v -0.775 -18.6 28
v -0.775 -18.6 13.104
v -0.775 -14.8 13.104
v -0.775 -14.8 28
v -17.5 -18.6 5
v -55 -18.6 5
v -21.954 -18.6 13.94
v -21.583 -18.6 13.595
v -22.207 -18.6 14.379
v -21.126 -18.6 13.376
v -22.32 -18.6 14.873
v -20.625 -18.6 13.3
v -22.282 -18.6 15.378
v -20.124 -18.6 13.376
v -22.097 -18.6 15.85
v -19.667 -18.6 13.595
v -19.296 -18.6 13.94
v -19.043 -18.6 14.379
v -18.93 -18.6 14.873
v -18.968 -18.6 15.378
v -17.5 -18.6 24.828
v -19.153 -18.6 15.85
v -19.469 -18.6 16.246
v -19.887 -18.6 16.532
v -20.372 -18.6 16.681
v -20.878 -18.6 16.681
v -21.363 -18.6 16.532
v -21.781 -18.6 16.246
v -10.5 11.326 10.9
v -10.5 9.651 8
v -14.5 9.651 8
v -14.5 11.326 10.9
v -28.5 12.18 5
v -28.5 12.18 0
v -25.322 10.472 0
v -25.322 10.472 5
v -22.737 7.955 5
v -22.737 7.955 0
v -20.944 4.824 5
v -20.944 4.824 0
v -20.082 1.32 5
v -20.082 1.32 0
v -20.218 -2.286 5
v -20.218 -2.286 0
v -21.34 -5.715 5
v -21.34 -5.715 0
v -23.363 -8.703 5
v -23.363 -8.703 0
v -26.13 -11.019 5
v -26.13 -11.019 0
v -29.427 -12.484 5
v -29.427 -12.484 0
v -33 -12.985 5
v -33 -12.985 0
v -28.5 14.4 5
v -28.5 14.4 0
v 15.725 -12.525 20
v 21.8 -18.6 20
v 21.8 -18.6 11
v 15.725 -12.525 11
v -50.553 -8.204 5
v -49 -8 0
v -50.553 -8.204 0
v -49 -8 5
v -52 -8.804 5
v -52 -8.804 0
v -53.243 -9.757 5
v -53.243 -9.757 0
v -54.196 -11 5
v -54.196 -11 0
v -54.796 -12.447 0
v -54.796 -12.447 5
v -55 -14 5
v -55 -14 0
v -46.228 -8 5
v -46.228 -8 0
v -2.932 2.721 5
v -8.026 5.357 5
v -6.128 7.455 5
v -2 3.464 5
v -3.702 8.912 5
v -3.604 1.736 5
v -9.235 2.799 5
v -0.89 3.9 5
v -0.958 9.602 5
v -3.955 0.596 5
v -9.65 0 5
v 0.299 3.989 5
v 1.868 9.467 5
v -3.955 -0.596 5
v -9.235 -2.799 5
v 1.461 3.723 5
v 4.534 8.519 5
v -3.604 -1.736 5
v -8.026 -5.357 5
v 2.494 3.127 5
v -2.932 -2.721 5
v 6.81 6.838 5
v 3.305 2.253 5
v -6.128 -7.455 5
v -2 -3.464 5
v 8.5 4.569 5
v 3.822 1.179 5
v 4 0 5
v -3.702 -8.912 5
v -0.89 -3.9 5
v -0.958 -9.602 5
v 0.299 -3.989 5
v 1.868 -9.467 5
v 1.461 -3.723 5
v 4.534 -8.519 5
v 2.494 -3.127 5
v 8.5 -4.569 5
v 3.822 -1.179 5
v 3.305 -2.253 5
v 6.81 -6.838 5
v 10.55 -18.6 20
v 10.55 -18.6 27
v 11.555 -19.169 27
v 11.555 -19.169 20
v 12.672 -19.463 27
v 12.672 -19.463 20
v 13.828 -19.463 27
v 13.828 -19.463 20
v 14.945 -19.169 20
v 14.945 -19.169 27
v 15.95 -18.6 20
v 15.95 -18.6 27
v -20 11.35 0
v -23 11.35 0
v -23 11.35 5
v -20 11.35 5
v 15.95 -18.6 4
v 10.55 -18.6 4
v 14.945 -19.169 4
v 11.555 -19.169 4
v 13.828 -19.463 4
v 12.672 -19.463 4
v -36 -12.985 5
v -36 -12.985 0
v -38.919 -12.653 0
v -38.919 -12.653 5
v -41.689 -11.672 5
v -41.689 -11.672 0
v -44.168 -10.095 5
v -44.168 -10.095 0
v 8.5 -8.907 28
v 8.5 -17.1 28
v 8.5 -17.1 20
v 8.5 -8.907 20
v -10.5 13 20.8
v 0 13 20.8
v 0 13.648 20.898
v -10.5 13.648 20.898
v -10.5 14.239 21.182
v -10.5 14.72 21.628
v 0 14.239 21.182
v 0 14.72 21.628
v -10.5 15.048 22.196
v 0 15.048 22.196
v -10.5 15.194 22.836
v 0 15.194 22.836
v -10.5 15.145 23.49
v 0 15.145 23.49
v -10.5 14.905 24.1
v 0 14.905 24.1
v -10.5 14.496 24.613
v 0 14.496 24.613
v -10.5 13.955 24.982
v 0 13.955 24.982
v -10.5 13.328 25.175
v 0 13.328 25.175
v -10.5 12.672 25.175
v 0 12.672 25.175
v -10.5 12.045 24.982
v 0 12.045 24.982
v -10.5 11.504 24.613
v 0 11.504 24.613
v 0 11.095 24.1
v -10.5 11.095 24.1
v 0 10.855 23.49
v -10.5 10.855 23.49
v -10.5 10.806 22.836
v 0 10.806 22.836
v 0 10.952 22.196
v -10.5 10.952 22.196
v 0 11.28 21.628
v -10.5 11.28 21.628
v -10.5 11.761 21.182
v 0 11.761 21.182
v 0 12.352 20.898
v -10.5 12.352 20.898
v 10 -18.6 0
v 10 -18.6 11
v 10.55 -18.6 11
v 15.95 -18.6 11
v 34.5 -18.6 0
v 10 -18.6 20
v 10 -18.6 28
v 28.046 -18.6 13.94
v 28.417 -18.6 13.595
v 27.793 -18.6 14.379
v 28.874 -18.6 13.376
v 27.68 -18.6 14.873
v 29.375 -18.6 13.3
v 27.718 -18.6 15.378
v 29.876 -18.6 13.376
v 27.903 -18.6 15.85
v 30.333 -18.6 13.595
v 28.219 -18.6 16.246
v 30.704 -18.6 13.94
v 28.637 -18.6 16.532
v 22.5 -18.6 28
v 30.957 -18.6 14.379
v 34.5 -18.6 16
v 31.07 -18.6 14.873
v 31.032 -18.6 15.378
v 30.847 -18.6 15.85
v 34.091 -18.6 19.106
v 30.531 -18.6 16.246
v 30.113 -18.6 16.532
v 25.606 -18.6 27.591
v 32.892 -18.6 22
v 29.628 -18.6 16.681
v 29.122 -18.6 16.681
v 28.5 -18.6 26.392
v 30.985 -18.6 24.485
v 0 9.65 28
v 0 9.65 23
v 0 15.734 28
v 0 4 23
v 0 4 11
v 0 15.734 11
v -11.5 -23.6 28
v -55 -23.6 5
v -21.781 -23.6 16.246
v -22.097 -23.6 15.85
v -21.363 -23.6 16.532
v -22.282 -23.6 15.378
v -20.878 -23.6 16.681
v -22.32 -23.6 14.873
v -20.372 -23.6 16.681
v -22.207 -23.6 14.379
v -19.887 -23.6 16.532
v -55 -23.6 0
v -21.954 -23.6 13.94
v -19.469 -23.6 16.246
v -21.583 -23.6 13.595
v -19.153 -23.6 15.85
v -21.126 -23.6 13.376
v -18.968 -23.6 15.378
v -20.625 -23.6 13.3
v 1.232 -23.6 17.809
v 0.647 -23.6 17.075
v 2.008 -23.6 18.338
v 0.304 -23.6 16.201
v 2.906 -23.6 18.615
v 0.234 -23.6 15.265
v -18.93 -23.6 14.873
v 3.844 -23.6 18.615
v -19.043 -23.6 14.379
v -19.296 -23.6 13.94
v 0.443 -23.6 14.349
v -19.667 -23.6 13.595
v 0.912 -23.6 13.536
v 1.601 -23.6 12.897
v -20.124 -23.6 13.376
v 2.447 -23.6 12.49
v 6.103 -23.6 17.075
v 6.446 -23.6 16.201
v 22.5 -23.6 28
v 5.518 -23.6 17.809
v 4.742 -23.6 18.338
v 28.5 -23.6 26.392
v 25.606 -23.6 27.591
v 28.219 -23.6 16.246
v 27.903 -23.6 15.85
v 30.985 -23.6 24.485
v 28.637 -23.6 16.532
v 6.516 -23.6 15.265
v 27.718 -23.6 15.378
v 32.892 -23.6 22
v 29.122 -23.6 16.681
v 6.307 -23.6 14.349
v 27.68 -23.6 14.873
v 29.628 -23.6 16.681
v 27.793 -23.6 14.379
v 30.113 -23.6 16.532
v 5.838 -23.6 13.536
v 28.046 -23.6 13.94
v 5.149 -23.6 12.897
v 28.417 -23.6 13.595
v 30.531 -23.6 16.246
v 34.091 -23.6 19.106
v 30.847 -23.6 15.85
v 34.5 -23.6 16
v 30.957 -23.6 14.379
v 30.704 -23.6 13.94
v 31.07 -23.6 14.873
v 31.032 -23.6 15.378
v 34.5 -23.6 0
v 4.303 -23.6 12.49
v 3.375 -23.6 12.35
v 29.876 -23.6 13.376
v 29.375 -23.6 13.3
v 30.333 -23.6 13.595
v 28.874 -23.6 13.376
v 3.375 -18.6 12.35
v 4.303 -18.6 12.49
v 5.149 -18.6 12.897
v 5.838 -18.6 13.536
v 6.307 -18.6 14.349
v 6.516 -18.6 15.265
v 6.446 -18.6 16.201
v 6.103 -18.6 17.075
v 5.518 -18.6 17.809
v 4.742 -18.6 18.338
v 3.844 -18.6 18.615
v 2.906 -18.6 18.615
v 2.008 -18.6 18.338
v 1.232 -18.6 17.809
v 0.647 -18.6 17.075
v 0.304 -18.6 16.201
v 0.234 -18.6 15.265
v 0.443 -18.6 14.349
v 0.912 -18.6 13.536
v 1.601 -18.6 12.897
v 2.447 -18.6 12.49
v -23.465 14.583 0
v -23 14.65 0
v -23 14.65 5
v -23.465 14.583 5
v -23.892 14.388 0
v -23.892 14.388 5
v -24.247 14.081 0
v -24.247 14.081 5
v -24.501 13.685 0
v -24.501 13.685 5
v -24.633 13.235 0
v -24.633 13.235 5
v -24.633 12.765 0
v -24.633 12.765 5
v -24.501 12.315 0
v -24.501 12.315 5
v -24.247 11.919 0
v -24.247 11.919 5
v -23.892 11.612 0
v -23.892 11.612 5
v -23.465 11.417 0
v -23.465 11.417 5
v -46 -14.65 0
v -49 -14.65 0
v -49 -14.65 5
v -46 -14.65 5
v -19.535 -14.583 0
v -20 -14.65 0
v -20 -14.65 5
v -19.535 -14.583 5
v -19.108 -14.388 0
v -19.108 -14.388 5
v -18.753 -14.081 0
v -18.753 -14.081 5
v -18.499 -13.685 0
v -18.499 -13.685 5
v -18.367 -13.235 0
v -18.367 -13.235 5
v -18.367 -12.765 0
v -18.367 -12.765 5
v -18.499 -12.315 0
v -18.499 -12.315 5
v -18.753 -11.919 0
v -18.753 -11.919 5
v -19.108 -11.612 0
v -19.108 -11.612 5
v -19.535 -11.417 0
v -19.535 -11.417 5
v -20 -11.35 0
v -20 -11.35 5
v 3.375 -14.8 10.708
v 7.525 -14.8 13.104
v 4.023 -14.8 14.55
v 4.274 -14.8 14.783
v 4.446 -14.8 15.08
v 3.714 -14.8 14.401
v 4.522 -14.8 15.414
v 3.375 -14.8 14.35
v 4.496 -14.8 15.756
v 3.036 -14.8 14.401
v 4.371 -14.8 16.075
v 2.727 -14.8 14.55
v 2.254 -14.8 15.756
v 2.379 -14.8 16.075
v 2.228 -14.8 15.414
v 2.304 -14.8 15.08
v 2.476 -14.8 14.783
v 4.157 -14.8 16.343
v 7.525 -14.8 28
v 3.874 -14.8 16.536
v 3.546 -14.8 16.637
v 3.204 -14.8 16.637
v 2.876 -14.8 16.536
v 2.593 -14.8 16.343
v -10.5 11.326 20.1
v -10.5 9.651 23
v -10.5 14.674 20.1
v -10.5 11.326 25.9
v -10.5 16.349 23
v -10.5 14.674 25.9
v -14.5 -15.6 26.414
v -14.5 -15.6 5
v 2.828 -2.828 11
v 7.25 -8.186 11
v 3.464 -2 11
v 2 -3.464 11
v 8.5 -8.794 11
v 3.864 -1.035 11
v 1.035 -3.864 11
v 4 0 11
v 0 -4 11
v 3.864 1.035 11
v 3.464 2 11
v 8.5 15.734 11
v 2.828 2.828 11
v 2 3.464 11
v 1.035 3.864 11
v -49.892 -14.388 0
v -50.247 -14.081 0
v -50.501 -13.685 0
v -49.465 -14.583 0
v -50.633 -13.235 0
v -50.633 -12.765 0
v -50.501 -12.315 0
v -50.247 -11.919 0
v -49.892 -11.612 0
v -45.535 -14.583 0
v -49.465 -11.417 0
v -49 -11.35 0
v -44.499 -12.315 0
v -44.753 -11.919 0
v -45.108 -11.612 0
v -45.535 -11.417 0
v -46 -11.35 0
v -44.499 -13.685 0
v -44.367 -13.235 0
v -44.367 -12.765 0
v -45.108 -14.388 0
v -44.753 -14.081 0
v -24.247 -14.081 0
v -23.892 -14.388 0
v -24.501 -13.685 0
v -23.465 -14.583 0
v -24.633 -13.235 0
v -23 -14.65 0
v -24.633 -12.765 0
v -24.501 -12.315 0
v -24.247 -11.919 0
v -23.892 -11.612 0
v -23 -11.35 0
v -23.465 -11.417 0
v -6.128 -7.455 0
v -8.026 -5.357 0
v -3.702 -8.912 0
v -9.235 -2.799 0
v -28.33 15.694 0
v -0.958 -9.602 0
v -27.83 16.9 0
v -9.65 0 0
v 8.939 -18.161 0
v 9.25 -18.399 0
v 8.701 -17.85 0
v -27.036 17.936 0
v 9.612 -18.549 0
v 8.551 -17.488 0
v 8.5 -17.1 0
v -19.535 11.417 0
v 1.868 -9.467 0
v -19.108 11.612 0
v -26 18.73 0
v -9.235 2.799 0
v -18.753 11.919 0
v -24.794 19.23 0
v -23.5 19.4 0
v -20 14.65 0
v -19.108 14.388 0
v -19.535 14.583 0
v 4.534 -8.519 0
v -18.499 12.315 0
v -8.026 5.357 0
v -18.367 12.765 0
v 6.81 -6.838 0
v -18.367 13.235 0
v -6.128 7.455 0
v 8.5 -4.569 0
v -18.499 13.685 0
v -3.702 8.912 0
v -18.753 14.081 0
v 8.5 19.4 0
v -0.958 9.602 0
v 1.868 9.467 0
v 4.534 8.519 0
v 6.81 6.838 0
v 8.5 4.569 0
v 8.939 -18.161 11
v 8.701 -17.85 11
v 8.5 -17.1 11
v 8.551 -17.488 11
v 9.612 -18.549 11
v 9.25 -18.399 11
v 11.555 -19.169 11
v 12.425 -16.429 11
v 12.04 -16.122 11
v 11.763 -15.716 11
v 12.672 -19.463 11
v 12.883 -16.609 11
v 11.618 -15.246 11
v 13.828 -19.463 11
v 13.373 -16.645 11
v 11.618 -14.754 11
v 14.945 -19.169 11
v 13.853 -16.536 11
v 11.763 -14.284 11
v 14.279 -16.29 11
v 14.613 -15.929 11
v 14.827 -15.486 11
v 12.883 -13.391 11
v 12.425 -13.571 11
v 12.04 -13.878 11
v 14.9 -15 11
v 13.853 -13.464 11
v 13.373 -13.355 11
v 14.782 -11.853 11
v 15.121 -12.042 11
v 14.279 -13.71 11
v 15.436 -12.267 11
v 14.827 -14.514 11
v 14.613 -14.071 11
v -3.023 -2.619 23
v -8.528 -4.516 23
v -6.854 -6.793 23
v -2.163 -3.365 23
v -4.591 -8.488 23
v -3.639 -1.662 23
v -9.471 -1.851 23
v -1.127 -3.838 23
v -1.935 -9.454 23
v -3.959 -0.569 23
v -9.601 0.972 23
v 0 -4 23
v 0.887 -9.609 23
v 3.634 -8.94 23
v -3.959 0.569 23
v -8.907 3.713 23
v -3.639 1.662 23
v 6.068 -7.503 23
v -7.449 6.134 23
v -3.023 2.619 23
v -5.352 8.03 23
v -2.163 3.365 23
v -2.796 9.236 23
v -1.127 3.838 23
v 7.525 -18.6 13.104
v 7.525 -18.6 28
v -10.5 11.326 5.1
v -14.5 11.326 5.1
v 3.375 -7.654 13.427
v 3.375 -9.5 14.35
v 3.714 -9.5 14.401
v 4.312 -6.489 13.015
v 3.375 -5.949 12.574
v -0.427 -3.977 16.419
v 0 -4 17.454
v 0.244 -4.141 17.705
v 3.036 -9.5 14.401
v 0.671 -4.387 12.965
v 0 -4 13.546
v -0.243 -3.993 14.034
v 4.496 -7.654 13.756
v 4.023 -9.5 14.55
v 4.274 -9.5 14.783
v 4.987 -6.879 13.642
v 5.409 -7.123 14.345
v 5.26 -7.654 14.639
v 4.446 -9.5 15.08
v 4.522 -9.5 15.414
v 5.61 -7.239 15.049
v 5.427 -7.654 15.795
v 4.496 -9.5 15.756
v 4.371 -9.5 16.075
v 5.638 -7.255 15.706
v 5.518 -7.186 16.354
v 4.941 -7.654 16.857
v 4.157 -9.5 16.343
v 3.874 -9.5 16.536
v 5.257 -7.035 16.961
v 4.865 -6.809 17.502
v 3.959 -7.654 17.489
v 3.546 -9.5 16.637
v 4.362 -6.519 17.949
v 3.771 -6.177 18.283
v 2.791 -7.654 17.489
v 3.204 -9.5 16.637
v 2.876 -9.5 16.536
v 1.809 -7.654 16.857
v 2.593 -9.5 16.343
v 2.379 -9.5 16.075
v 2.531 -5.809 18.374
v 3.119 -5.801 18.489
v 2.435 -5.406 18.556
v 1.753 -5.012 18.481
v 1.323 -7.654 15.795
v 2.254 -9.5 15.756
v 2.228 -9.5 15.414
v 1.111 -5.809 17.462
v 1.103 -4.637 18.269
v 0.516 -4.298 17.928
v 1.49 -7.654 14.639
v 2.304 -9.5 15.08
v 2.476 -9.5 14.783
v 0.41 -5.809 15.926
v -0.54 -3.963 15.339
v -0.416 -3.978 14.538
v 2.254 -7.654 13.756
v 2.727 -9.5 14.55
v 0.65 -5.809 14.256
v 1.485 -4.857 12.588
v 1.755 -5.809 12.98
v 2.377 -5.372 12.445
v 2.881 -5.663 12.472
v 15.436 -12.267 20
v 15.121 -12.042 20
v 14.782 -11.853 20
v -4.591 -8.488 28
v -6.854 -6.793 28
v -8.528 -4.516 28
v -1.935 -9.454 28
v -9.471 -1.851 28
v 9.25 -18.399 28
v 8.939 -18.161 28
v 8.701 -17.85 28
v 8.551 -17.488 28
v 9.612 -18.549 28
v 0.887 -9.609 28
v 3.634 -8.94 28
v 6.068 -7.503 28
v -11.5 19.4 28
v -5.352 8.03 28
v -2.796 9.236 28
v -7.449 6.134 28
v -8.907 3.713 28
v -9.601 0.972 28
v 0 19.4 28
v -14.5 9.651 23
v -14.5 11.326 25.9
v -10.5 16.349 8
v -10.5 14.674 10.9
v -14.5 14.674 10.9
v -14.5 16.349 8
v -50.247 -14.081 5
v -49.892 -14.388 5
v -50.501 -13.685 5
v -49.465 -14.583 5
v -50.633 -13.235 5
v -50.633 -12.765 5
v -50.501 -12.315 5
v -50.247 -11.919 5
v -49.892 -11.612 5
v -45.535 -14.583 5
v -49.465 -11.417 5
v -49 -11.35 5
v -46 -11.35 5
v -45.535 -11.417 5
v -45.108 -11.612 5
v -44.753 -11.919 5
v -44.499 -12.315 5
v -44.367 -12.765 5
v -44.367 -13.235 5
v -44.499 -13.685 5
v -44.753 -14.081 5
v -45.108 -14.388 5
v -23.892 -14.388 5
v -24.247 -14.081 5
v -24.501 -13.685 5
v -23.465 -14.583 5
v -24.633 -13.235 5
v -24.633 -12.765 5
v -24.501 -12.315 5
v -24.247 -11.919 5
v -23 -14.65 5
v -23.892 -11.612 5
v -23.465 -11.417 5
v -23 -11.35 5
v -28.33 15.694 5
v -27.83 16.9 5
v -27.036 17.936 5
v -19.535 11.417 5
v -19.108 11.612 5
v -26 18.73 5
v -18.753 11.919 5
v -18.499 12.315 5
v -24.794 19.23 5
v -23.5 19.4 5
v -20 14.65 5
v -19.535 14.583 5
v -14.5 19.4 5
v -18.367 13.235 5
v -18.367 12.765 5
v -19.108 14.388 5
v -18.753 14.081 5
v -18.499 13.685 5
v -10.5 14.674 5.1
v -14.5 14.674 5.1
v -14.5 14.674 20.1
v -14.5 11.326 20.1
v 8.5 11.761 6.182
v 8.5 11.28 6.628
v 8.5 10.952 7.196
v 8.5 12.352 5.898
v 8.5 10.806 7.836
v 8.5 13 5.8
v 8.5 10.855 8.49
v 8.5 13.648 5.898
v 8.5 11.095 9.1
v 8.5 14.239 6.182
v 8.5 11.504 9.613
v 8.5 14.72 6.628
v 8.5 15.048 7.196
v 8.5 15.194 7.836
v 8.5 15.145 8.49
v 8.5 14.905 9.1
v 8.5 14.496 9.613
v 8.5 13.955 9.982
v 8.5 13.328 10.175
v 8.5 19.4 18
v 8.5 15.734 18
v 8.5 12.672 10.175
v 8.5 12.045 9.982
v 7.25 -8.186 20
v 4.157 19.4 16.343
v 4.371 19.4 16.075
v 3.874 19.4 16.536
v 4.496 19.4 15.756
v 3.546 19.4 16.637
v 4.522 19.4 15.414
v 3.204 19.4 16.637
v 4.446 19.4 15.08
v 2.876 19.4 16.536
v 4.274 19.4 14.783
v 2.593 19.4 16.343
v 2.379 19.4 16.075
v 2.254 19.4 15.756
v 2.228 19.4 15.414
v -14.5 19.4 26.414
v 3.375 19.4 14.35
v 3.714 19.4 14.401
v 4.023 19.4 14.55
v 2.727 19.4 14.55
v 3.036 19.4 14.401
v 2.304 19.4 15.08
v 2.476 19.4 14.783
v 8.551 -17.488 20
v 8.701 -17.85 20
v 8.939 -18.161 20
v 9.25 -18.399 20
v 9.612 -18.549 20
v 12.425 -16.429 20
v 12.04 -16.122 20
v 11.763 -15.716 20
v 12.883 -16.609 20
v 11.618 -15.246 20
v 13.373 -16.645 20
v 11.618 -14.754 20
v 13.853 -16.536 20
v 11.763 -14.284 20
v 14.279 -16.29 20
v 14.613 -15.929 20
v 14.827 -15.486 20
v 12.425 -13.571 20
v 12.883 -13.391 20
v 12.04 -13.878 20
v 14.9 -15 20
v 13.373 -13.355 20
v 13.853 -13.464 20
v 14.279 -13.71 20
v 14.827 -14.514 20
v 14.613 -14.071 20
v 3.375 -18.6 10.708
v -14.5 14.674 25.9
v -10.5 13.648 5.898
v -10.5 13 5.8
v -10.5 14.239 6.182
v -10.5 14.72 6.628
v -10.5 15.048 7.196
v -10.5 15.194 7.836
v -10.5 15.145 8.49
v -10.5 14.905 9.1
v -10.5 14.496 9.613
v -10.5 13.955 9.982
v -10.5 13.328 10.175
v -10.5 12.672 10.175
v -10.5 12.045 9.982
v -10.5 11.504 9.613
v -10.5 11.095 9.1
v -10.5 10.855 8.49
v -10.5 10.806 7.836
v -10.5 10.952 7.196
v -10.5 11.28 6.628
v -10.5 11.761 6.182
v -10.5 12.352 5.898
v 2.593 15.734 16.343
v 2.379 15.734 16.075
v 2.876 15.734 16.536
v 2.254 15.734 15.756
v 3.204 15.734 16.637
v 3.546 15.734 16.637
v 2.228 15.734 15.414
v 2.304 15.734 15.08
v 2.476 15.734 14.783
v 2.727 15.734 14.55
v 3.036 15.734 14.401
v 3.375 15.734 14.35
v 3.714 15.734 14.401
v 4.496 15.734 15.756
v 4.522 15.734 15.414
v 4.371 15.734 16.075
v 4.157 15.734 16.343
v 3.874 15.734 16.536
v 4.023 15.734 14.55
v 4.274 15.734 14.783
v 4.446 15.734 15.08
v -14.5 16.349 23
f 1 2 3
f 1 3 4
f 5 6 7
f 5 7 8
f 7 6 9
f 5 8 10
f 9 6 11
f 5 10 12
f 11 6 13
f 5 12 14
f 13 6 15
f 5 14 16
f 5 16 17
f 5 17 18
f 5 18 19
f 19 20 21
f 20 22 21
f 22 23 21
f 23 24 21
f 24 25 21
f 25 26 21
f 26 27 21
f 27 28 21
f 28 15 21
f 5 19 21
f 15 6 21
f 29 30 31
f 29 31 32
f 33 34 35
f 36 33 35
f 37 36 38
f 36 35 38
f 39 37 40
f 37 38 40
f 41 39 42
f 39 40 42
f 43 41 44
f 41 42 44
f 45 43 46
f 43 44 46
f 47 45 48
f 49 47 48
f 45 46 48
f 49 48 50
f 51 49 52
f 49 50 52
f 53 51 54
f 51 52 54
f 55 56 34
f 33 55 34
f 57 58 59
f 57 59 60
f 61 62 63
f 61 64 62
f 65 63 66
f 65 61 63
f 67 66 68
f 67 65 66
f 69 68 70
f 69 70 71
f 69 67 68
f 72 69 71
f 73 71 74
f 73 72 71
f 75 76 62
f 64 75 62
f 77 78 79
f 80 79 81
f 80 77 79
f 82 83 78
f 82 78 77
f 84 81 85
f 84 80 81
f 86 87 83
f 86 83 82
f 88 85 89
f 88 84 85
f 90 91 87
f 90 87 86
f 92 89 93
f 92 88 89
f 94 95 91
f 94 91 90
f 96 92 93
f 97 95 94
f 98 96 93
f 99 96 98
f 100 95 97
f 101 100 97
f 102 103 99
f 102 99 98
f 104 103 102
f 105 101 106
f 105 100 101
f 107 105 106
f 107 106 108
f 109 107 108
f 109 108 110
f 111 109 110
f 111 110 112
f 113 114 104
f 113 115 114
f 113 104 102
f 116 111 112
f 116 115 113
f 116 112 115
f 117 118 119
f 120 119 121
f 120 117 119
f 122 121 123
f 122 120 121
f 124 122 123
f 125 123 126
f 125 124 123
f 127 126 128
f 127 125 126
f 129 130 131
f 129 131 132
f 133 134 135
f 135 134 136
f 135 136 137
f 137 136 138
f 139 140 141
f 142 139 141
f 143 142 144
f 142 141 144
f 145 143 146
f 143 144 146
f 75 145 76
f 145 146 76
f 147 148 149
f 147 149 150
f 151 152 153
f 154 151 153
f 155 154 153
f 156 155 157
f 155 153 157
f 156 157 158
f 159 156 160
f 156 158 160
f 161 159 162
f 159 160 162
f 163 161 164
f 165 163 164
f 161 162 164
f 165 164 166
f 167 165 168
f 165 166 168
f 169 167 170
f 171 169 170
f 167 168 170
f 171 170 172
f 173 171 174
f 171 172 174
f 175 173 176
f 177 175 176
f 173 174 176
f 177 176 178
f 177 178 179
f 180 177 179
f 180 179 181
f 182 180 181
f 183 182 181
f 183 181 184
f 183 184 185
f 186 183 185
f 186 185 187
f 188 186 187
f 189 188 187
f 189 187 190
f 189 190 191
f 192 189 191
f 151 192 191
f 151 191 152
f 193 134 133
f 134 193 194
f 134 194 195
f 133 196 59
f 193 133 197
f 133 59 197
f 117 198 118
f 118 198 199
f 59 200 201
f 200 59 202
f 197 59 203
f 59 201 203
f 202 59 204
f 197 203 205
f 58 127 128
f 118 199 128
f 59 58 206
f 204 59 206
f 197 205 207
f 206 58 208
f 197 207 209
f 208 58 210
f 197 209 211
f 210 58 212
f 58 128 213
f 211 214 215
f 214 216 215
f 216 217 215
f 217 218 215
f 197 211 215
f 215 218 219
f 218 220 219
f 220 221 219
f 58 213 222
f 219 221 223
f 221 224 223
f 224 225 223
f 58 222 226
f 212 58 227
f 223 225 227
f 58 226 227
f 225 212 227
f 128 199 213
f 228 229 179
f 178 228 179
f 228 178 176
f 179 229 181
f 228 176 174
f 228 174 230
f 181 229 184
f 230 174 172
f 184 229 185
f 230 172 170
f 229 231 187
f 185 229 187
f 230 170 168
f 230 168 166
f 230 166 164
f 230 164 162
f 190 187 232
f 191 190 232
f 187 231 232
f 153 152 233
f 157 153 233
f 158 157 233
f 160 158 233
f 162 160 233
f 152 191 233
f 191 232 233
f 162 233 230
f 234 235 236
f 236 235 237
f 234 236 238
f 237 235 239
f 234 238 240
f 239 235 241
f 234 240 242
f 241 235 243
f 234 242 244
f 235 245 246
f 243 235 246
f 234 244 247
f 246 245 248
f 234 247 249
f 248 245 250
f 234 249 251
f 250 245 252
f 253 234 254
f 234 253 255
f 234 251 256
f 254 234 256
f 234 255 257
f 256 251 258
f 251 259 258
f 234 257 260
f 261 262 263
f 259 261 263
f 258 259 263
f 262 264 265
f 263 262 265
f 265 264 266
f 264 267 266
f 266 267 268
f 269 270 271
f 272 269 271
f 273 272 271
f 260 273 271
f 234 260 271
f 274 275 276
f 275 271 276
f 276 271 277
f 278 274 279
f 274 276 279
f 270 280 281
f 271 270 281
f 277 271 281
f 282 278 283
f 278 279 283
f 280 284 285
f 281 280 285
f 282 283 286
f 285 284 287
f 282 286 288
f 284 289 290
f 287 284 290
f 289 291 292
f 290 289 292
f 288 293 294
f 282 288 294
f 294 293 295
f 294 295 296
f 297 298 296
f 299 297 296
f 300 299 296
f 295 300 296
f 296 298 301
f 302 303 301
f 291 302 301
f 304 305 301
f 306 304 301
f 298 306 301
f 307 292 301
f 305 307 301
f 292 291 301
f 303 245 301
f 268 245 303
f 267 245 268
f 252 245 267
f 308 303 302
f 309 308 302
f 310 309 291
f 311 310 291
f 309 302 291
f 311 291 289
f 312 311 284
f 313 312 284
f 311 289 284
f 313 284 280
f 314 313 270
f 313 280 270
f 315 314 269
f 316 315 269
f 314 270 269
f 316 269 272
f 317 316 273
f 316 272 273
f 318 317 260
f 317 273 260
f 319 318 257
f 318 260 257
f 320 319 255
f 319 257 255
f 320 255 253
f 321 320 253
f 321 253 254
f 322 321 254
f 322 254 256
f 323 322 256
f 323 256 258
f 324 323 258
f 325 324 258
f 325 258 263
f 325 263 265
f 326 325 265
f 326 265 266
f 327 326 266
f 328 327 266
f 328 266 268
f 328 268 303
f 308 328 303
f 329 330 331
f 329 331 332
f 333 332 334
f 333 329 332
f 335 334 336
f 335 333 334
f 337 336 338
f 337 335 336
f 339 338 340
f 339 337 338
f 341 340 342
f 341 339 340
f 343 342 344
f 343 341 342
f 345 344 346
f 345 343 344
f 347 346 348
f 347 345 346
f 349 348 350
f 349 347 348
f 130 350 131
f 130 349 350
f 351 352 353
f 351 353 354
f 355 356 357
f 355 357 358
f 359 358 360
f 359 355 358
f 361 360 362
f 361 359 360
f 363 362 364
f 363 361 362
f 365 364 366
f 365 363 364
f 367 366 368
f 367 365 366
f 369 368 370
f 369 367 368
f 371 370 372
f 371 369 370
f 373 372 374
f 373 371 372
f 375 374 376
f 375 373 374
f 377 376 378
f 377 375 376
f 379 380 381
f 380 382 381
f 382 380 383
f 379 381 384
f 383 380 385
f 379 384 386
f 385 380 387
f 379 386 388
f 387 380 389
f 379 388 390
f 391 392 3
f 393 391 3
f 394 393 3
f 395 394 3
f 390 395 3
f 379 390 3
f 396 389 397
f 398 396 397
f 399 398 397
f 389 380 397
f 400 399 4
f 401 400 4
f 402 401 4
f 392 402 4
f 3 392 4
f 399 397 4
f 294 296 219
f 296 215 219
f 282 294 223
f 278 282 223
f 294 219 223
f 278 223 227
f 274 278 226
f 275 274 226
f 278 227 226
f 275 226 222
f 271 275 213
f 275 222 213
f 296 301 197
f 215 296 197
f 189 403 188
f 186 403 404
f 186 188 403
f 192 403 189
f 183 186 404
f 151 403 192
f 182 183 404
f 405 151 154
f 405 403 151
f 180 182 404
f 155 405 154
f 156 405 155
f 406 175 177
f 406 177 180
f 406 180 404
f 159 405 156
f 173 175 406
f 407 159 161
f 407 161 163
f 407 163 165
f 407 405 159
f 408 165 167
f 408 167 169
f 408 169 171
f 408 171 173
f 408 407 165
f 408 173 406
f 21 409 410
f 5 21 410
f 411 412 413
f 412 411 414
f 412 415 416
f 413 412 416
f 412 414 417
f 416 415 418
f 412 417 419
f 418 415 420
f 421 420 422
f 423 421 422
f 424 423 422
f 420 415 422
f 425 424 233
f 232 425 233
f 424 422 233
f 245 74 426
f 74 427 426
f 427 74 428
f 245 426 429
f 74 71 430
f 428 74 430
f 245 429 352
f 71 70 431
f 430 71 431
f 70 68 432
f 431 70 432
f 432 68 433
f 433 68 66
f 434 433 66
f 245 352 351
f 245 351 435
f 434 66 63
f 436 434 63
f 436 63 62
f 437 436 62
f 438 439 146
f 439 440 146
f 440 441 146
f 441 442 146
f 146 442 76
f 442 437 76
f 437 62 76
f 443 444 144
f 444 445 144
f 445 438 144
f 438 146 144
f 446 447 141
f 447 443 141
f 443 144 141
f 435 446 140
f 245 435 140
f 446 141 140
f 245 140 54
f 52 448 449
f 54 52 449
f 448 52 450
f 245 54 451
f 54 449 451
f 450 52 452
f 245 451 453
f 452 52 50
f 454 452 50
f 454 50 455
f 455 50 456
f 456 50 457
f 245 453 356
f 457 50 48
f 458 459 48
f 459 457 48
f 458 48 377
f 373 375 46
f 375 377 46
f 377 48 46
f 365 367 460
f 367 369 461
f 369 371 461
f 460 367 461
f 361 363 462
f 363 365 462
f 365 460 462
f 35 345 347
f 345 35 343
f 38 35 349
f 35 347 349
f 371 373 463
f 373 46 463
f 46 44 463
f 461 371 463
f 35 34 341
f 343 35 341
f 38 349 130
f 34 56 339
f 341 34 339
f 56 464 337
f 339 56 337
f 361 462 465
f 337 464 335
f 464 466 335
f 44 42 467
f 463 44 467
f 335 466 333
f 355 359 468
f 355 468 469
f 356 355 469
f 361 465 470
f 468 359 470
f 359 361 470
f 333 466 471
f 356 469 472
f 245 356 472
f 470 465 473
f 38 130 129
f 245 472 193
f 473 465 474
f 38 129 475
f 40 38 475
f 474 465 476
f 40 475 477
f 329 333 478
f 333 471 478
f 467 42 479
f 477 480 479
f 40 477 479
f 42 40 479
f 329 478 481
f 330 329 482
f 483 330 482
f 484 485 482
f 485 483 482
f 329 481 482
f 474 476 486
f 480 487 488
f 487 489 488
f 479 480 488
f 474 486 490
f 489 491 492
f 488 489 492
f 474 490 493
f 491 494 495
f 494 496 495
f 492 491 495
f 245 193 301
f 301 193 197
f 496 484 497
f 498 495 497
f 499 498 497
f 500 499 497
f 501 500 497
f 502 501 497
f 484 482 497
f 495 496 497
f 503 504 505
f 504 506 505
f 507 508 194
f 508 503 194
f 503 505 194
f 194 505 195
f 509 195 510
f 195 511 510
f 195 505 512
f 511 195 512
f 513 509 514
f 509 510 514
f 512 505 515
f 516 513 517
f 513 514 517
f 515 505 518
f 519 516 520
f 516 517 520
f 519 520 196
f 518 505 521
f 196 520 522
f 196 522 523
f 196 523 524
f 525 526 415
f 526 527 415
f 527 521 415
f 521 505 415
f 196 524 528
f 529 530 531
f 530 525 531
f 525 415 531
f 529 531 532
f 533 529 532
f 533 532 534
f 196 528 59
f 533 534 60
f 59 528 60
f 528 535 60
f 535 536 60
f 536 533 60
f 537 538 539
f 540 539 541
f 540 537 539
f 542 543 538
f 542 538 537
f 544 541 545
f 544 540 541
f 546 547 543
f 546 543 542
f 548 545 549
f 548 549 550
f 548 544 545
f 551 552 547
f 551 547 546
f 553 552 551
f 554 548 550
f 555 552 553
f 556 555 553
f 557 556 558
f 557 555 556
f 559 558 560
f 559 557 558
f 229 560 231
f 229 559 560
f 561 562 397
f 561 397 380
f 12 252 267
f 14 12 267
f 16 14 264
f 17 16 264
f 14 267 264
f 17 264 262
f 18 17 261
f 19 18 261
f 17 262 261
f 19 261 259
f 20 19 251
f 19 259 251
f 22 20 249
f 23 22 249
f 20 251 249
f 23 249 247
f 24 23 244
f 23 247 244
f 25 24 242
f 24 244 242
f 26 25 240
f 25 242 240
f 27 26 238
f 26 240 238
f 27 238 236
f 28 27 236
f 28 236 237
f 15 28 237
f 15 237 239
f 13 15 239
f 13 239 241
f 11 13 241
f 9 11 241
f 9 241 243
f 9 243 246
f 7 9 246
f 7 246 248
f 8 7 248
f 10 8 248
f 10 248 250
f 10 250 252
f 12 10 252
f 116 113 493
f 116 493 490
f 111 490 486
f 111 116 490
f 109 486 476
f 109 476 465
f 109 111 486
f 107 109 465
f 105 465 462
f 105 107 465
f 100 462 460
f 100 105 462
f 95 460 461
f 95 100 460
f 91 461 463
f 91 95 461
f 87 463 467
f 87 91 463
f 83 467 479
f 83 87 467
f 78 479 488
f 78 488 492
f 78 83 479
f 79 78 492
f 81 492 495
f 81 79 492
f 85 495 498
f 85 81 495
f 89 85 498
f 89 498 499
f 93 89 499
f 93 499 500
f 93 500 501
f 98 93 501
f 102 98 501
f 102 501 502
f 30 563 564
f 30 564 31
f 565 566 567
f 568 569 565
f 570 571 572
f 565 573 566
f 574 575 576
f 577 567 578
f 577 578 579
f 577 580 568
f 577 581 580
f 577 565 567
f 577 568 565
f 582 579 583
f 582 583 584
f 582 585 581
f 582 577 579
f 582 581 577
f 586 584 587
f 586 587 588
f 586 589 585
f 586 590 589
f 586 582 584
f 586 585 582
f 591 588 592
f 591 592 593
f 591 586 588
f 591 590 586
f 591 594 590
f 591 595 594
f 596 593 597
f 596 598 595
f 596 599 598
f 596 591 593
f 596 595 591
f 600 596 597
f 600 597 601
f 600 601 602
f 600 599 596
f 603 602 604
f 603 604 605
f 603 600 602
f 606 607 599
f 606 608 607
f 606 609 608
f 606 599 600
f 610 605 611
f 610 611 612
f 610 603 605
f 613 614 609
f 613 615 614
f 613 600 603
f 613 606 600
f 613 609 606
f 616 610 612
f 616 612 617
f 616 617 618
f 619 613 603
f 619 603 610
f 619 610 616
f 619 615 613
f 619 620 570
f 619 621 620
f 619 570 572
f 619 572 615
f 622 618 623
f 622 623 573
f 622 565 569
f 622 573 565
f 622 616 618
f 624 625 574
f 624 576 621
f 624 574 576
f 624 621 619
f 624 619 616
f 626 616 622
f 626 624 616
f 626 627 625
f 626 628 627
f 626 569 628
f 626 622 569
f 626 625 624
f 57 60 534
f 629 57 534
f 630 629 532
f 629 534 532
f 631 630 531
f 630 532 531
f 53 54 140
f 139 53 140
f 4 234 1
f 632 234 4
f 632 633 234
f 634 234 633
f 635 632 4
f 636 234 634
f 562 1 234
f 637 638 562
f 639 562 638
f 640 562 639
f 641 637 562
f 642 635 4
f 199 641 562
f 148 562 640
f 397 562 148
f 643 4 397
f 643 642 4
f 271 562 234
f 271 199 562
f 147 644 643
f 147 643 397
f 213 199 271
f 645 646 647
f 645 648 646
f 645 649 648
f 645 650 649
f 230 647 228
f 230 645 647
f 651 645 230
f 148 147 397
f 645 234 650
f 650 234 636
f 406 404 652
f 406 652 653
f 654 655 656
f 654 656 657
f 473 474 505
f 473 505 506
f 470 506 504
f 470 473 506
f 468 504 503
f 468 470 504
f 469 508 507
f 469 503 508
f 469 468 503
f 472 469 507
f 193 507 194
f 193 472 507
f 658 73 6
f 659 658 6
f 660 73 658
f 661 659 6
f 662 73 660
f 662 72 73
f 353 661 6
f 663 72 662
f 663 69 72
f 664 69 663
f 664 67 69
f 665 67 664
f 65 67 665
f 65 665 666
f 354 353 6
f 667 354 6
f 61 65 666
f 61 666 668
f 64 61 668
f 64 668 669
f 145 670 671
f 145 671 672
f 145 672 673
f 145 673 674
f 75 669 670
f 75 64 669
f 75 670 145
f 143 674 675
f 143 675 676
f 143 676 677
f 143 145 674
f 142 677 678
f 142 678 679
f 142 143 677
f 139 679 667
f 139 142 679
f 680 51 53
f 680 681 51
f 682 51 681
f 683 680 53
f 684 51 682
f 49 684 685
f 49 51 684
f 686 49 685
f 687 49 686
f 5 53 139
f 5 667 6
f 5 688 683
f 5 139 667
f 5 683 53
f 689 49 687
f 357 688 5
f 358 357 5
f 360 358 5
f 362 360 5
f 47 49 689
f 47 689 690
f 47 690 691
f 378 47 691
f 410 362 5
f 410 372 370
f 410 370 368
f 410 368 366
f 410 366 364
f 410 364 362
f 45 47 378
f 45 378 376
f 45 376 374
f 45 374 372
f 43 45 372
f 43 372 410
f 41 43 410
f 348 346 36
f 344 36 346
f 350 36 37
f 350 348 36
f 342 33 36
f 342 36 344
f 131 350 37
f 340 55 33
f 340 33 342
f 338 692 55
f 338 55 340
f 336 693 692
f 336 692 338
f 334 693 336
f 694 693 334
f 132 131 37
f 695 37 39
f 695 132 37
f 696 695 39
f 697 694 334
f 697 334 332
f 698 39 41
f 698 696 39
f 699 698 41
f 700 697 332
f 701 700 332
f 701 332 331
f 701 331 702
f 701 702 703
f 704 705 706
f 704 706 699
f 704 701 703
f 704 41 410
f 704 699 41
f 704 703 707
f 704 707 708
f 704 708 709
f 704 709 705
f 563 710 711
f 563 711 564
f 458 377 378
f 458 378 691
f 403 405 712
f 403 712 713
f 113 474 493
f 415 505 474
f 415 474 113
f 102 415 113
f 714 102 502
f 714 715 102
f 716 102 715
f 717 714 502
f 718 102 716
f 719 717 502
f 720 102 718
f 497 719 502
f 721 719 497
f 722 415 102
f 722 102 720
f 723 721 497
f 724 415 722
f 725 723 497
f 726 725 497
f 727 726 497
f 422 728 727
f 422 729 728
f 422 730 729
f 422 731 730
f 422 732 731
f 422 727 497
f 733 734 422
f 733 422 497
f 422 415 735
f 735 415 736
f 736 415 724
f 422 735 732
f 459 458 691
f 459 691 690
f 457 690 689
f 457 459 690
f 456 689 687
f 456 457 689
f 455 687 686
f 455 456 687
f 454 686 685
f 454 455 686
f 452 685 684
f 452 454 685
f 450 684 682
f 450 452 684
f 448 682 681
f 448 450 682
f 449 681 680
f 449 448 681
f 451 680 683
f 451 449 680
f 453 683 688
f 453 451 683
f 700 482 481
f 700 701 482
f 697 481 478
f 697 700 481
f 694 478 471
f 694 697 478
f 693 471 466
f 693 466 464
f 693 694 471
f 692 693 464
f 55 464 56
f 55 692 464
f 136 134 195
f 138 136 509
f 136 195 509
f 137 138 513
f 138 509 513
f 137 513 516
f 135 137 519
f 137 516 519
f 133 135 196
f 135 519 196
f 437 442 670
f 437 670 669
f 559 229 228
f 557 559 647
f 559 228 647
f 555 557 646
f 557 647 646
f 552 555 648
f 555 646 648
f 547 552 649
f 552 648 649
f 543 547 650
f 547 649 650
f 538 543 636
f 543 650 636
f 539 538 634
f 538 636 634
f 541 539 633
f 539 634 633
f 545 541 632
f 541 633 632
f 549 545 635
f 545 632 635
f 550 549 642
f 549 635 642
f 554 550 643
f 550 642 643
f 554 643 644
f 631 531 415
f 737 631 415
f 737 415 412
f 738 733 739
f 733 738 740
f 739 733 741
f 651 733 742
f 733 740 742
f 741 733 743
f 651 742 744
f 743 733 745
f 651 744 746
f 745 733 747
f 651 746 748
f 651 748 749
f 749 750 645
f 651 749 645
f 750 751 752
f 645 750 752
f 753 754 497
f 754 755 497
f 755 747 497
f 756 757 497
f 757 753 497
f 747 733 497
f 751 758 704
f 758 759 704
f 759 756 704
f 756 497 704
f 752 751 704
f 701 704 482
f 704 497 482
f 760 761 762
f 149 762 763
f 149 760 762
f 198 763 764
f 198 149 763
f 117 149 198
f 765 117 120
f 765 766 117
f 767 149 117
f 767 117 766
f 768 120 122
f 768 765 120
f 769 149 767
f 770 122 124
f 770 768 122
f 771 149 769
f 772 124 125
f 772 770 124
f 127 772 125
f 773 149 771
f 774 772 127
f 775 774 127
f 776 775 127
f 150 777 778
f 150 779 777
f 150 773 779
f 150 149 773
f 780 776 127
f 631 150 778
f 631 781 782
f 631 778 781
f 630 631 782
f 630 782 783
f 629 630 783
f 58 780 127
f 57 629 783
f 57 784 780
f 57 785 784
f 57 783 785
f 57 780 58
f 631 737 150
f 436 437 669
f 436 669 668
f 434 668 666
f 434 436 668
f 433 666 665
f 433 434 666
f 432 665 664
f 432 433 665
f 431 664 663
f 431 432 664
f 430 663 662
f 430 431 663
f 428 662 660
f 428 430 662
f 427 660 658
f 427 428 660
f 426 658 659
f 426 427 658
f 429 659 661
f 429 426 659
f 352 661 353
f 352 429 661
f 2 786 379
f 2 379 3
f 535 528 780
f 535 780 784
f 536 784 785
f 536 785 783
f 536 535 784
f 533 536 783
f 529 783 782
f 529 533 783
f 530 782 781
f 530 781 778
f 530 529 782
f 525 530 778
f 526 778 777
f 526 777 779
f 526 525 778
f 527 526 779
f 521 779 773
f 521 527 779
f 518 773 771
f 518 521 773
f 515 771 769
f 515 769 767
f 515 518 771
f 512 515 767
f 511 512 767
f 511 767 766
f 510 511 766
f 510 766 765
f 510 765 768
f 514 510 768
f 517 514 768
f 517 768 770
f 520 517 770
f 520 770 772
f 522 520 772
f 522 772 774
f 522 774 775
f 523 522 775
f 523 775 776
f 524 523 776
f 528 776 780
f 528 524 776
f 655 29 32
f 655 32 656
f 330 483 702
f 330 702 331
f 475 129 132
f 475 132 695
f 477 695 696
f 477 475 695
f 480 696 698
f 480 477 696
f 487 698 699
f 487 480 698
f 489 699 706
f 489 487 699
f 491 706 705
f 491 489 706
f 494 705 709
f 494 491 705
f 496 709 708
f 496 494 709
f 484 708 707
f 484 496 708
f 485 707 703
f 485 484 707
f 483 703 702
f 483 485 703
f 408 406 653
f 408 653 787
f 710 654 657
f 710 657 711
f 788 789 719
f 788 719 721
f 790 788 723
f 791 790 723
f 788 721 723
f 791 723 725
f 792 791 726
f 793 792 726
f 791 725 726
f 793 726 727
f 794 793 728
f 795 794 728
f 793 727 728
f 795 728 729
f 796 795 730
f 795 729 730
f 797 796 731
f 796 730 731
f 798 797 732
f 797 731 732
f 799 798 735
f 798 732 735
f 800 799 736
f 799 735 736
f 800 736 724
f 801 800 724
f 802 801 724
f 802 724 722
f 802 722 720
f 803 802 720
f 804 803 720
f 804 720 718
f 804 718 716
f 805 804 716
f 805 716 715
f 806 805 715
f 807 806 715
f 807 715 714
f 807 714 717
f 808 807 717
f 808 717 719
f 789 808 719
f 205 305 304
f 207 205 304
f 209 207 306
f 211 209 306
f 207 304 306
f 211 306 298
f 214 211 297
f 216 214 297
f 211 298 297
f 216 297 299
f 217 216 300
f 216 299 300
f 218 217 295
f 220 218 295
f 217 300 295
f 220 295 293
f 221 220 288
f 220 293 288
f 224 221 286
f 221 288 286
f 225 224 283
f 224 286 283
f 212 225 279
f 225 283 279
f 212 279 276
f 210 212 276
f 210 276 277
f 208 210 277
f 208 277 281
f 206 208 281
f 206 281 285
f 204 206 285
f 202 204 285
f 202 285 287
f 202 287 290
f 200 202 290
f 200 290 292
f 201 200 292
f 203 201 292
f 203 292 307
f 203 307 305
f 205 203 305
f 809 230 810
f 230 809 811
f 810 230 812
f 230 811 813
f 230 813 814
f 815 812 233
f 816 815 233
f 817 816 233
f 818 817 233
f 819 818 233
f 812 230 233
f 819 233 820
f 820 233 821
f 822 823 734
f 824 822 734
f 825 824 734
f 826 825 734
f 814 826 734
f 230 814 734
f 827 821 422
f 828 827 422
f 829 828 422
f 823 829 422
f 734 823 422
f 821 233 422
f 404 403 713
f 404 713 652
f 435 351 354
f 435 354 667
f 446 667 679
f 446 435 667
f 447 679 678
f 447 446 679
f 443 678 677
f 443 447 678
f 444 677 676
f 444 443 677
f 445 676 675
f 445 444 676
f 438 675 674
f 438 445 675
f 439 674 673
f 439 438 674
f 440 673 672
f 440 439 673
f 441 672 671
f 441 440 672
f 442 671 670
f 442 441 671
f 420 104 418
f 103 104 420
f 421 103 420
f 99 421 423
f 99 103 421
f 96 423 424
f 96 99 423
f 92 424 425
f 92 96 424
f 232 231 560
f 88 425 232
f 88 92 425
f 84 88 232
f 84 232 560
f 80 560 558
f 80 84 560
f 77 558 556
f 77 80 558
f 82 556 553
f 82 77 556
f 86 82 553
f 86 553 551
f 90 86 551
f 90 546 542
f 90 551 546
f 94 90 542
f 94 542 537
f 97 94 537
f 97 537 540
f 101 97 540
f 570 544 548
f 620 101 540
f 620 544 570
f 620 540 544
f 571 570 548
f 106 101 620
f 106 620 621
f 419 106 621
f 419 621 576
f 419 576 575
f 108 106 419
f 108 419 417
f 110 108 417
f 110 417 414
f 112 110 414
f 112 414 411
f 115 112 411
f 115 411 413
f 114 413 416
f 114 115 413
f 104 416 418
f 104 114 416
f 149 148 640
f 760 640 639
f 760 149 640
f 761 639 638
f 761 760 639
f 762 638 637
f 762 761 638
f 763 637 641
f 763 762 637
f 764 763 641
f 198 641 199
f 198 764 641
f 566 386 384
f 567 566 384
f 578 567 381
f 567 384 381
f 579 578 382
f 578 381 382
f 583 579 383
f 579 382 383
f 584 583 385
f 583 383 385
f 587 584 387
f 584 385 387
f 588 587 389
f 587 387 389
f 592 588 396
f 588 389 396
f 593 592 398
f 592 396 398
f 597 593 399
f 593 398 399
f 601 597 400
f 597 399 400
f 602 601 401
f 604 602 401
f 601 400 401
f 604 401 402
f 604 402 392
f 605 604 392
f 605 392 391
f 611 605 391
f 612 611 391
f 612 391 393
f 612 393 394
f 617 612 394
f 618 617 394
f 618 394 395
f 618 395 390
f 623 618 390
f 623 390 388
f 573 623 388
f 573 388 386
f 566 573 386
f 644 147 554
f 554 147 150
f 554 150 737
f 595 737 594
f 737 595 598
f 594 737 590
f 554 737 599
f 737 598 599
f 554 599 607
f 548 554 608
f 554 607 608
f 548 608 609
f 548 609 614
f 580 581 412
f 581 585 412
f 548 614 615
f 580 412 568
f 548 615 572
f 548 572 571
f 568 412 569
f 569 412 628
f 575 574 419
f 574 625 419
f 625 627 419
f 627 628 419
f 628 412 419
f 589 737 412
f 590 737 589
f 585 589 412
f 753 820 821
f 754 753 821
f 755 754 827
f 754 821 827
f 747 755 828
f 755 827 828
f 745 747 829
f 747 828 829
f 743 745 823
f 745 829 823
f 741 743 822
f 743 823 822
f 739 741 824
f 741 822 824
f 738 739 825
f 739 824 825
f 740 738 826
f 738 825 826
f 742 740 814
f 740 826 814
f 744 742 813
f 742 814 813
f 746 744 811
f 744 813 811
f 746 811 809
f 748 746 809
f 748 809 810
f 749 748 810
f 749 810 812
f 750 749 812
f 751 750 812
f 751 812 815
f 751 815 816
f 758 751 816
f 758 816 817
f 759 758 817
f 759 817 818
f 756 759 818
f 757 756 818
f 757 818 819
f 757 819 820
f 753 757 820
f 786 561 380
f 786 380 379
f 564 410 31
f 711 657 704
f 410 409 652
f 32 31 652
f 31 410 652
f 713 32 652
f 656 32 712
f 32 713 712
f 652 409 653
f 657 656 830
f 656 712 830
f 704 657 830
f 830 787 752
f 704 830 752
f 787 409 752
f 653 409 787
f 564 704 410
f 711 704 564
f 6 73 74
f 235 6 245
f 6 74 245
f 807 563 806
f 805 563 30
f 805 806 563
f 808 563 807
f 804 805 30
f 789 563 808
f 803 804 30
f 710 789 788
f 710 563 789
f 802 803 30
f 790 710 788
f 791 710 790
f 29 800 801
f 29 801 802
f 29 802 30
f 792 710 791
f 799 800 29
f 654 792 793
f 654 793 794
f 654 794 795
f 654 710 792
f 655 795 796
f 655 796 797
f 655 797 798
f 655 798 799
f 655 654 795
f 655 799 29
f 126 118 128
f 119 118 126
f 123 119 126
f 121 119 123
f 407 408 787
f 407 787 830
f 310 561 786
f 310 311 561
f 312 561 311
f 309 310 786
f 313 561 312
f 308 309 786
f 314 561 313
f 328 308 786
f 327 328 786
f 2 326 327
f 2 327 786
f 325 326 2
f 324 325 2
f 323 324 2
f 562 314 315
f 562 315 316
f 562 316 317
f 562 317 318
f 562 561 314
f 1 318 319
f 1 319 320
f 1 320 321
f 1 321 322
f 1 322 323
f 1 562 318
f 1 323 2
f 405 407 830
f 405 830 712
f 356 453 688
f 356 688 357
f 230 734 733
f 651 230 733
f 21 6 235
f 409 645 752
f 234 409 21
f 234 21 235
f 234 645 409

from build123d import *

# Parameters (mm, degrees)
SKETCH1_R                = 4
BOSS_EXTRUDE1_DEPTH      = 28
SKETCH2_W                = 40.5
SKETCH2_H                = 38
CUT_EXTRUDE1_DEPTH       = 23
SKETCH3_R                = 9.65
CUT_EXTRUDE2_DEPTH       = 5
CUT_EXTRUDE3_START       = -5
SKETCH4_R                = 9.65
CUT_EXTRUDE3_DEPTH       = 5
SKETCH8_R                = 1.15
CUT_EXTRUDE7_DEPTH       = 76.219678276
CHAMFER1_SIZE            = 23
CHAMFER1_SIZE2           = 43.5
SKETCH9_R                = 2.2
CUT_EXTRUDE8_DEPTH       = 97.701654612
CUT_EXTRUDE9_DEPTH       = 3
CUT_EXTRUDE9_DEPTH_BACK  = 4
CHAMFER2_SIZE            = 3
SKETCH15_R               = 1.7
CUT_EXTRUDE11_DEPTH      = 76.219678334
SKETCH16_W               = 26
SKETCH16_H               = 38
CUT_EXTRUDE12_DEPTH      = 67.075411499
FILLET6_R                = 1.5
CUT_EXTRUDE13_START      = -17
CUT_EXTRUDE13_DEPTH      = 17
BOSS_EXTRUDE3_DEPTH      = 4.5
BOSS_EXTRUDE3_DEPTH_BACK = 4.5
SKETCH21_R               = 1.65
SKETCH22_R               = 4.5
CUT_EXTRUDE14_DEPTH      = 7
CHAMFER4_SIZE            = 8.5
CHAMFER4_SIZE2           = 10
FILLET1_R                = 5
FILLET2_R                = 6
FILLET4_R                = 12
CUT_EXTRUDE15_DEPTH      = 3.8
CUT_EXTRUDE18_REACH      = 77.22
SKETCH26_R               = 3.15


with BuildPart() as part:
    # Sketch1 → Boss-Extrude1 (new body)
    with BuildSketch(Plane.XY):
        with BuildLine():
            Line((-55, -23.6), (34.5, -23.6))
            Line((34.5, -23.6), (34.5, 19.4))
            Line((34.5, 19.4), (-28.5, 19.4))
            Line((-28.5, 19.4), (-28.5, 12.180409823))
            ThreePointArc((-28.5, 12.180409823), (-20.217668105, -2.285689125), (-33, -12.985083113))
            Line((-33, -12.985083113), (-36, -12.985083113))
            ThreePointArc((-36, -12.985083113), (-41.689100041, -11.672468641), (-46.228019527, -8))
            Line((-46.228019527, -8), (-55, -8))
            Line((-55, -8), (-55, -23.6))
        make_face()
        Circle(SKETCH1_R, mode=Mode.SUBTRACT)
        with BuildLine():
            Line((-23, 11.35), (-20, 11.35))
            ThreePointArc((-20, 11.35), (-18.35, 13), (-20, 14.65))
            Line((-20, 14.65), (-23, 14.65))
            ThreePointArc((-23, 14.65), (-24.65, 13), (-23, 11.35))
        make_face(mode=Mode.SUBTRACT)
        with BuildLine():
            Line((-23, -14.65), (-20, -14.65))
            ThreePointArc((-20, -14.65), (-18.35, -13), (-20, -11.35))
            Line((-20, -11.35), (-23, -11.35))
            ThreePointArc((-23, -11.35), (-24.65, -13), (-23, -14.65))
        make_face(mode=Mode.SUBTRACT)
        with BuildLine():
            Line((-46, -11.35), (-49, -11.35))
            ThreePointArc((-49, -11.35), (-50.65, -13), (-49, -14.65))
            Line((-49, -14.65), (-46, -14.65))
            ThreePointArc((-46, -14.65), (-44.35, -13), (-46, -11.35))
        make_face(mode=Mode.SUBTRACT)
    extrude(amount=BOSS_EXTRUDE1_DEPTH)

    # Sketch2 → Cut-Extrude1 (cut)
    with BuildSketch(Plane.XY.offset(28)):
        with Locations((-34.75, 0.4)):
            Rectangle(SKETCH2_W, SKETCH2_H)
    extrude(amount=-CUT_EXTRUDE1_DEPTH, mode=Mode.SUBTRACT)

    # Sketch3 → Cut-Extrude2 (cut)
    with BuildSketch(Plane.XY.offset(28)):
        Circle(SKETCH3_R)
    extrude(amount=-CUT_EXTRUDE2_DEPTH, mode=Mode.SUBTRACT)

    # Sketch4 → Cut-Extrude3 (cut)
    with BuildSketch(Plane(origin=(0, 0, 0), x_dir=(-1, 0, 0), z_dir=(0, 0, -1)).offset(CUT_EXTRUDE3_START)):
        with Locations(Location((0, 0, 0), (0, 0, 180))):
            Circle(SKETCH4_R)
    extrude(amount=CUT_EXTRUDE3_DEPTH, mode=Mode.SUBTRACT)

    # Sketch8 → Cut-Extrude7 (cut, through all)
    with BuildSketch(Plane.XZ.offset(23.6)):
        with Locations(Location((3.375, 15.5, 0), (0, 0, 270))):
            Circle(SKETCH8_R)
    extrude(amount=-CUT_EXTRUDE7_DEPTH, mode=Mode.SUBTRACT)

    # Chamfer1
    chamfer1_edges = [part.edges().sort_by_distance(p)[0] for p in [
        (-55, -21.1, 28),
    ]]
    chamfer1_side = [part.faces().sort_by_distance(p)[0] for p in [
        (-55, -18.958031088, 10.841968912),
    ]]
    chamfer(chamfer1_edges, length=CHAMFER1_SIZE, length2=CHAMFER1_SIZE2, reference=chamfer1_side[0])

    # Sketch9 → Cut-Extrude8 (cut, through all)
    with BuildSketch(Plane(origin=(34.5, 0, 0), x_dir=(0, 0, -1), z_dir=(1, 0, 0))):
        with Locations((-8, 13)):
            Circle(SKETCH9_R)
        with Locations((-23, 13)):
            Circle(SKETCH9_R)
    extrude(amount=-CUT_EXTRUDE8_DEPTH, mode=Mode.SUBTRACT)

    # Sketch10 → Cut-Extrude9 (cut, two sides: drawn at the far end of the back side and taken through both)
    with BuildSketch(Plane.ZY.offset(14.5).offset(-CUT_EXTRUDE9_DEPTH_BACK)):
        Polygon((5.1, 14.674315781), (5.1, 11.325684219), (8, 9.651368439), (10.9, 11.325684219), (10.9, 14.674315781), (8, 16.348631561), align=None)
        Polygon((25.9, 11.325684219), (25.9, 14.674315781), (23, 16.348631561), (20.1, 14.674315781), (20.1, 11.325684219), (23, 9.651368439), align=None)
    extrude(amount=CUT_EXTRUDE9_DEPTH + CUT_EXTRUDE9_DEPTH_BACK, mode=Mode.SUBTRACT)

    # Chamfer2
    chamfer2_edges = [part.edges().sort_by_distance(p)[0] for p in [
        (-14.5, -18.6, 15.706896552),
    ]]
    chamfer(chamfer2_edges, length=CHAMFER2_SIZE)

    # Sketch15 → Cut-Extrude11 (cut, through all)
    with BuildSketch(Plane.XZ.offset(23.6)):
        with Locations(Location((-20.625, 15, 0), (0, 0, 270))):
            Circle(SKETCH15_R)
        with Locations(Location((29.375, 15, 0), (0, 0, 270))):
            Circle(SKETCH15_R)
    extrude(amount=-CUT_EXTRUDE11_DEPTH, mode=Mode.SUBTRACT)

    # Sketch16 → Cut-Extrude12 (cut, through all)
    with BuildSketch(Plane.XY.offset(28)):
        with Locations((21.5, 0.4)):
            Rectangle(SKETCH16_W, SKETCH16_H)
    extrude(amount=-CUT_EXTRUDE12_DEPTH, mode=Mode.SUBTRACT)

    # Fillet6
    fillet6_edges = [part.edges().sort_by_distance(p)[0] for p in [
        (8.5, -18.6, 14),
    ]]
    fillet(fillet6_edges, radius=FILLET6_R)

    # Sketch17 → Cut-Extrude13 (cut)
    with BuildSketch(Plane.XY.offset(28).offset(CUT_EXTRUDE13_START)):
        with BuildLine():
            Line((0, 4), (0, 15.733500455))
            Line((0, 15.733500455), (8.5, 15.733500455))
            Line((8.5, 15.733500455), (8.5, -8.907477288))
            Line((8.5, -8.907477288), (0, -4))
            ThreePointArc((0, -4), (4, 0), (0, 4))
        make_face()
    extrude(amount=CUT_EXTRUDE13_DEPTH, mode=Mode.SUBTRACT)

    # Sketch20 → Cut-Revolve1 (revolve, cut)
    with BuildSketch(Plane.XY.offset(15.5), mode=Mode.PRIVATE) as cut_revolve1_sk:
        Polygon((3.375, -11.8), (7.375, -3.8), (3.375, -3.8), align=None)
    revolve(cut_revolve1_sk.sketch.rotate(Axis((3.375, -3.8, 15.5), (0, -1, 0)), 270), axis=Axis((3.375, -3.8, 15.5), (0, -1, 0)), mode=Mode.SUBTRACT)

    # Sketch21 → Boss-Extrude3 (add, two sides: drawn at the far end of the back side and taken through both)
    with BuildSketch(Plane.XY.offset(15.5).offset(-BOSS_EXTRUDE3_DEPTH_BACK)):
        with BuildLine():
            Line((14.782175503, -11.85318602), (7.25, -8.185789452))
            Line((7.25, -8.185789452), (7.25, -18.6))
            Line((7.25, -18.6), (21.799747468, -18.6))
            Line((21.799747468, -18.6), (15.724873734, -12.525126266))
            ThreePointArc((15.724873734, -12.525126266), (15.281498664, -12.14990997), (14.782175503, -11.85318602))
        make_face()
        with Locations((13.25, -15)):
            Circle(SKETCH21_R, mode=Mode.SUBTRACT)
    extrude(amount=BOSS_EXTRUDE3_DEPTH + BOSS_EXTRUDE3_DEPTH_BACK)

    # Sketch22 → Cut-Extrude14 (cut)
    with BuildSketch(Plane.XY.offset(20)):
        with Locations((13.25, -15)):
            Circle(SKETCH22_R)
    cut_extrude14 = extrude(amount=CUT_EXTRUDE14_DEPTH, mode=Mode.SUBTRACT)

    # Mirror1: Cut-Extrude14 across plane
    add(cut_extrude14.mirror(Plane.XY.offset(15.5)), mode=Mode.SUBTRACT)

    # Chamfer4
    chamfer4_edges = [part.edges().sort_by_distance(p)[0] for p in [
        (8.5, 17.566750228, 28),
    ]]
    chamfer4_side = [part.faces().sort_by_distance(p)[0] for p in [
        (7.87031754, -13.003738644, 28),
    ]]
    chamfer(chamfer4_edges, length=CHAMFER4_SIZE, length2=CHAMFER4_SIZE2, reference=chamfer4_side[0])

    # Fillet1
    fillet1_edges = [part.edges().sort_by_distance(p)[0] for p in [
        (-28.5, 19.4, 2.5),
    ]]
    fillet(fillet1_edges, radius=FILLET1_R)

    # Fillet2
    fillet2_edges = [part.edges().sort_by_distance(p)[0] for p in [
        (-55, -8, 2.5),
    ]]
    fillet(fillet2_edges, radius=FILLET2_R)

    # Fillet4
    fillet4_edges = [part.edges().sort_by_distance(p)[0] for p in [
        (34.5, -21.1, 28),
    ]]
    fillet(fillet4_edges, radius=FILLET4_R)

    # Sketch23 → Cut-Extrude15 (cut)
    with BuildSketch(Plane.XZ.offset(18.6)):
        Polygon((-0.775, 28.722034997), (7.525, 28.722034997), (7.525, 13.103996383), (3.375, 10.707992766), (-0.775, 13.103996383), align=None)
    extrude(amount=-CUT_EXTRUDE15_DEPTH, mode=Mode.SUBTRACT)

    # Sketch26 → Cut-Extrude18 (cut, up to next)
    with BuildSketch(Plane.XZ.offset(23.6), mode=Mode.PRIVATE) as cut_extrude18_sk1:
        with Locations(Location((3.375, 15.5, 0), (0, 0, 270))):
            Circle(SKETCH26_R)
    cut_extrude18_tool1 = extrude(cut_extrude18_sk1.sketch, amount=-CUT_EXTRUDE18_REACH, mode=Mode.PRIVATE) & part.part
    add(cut_extrude18_tool1.solids().sort_by_distance((3.375, -23.6, 15.5))[0], mode=Mode.SUBTRACT)


solid = part.part
